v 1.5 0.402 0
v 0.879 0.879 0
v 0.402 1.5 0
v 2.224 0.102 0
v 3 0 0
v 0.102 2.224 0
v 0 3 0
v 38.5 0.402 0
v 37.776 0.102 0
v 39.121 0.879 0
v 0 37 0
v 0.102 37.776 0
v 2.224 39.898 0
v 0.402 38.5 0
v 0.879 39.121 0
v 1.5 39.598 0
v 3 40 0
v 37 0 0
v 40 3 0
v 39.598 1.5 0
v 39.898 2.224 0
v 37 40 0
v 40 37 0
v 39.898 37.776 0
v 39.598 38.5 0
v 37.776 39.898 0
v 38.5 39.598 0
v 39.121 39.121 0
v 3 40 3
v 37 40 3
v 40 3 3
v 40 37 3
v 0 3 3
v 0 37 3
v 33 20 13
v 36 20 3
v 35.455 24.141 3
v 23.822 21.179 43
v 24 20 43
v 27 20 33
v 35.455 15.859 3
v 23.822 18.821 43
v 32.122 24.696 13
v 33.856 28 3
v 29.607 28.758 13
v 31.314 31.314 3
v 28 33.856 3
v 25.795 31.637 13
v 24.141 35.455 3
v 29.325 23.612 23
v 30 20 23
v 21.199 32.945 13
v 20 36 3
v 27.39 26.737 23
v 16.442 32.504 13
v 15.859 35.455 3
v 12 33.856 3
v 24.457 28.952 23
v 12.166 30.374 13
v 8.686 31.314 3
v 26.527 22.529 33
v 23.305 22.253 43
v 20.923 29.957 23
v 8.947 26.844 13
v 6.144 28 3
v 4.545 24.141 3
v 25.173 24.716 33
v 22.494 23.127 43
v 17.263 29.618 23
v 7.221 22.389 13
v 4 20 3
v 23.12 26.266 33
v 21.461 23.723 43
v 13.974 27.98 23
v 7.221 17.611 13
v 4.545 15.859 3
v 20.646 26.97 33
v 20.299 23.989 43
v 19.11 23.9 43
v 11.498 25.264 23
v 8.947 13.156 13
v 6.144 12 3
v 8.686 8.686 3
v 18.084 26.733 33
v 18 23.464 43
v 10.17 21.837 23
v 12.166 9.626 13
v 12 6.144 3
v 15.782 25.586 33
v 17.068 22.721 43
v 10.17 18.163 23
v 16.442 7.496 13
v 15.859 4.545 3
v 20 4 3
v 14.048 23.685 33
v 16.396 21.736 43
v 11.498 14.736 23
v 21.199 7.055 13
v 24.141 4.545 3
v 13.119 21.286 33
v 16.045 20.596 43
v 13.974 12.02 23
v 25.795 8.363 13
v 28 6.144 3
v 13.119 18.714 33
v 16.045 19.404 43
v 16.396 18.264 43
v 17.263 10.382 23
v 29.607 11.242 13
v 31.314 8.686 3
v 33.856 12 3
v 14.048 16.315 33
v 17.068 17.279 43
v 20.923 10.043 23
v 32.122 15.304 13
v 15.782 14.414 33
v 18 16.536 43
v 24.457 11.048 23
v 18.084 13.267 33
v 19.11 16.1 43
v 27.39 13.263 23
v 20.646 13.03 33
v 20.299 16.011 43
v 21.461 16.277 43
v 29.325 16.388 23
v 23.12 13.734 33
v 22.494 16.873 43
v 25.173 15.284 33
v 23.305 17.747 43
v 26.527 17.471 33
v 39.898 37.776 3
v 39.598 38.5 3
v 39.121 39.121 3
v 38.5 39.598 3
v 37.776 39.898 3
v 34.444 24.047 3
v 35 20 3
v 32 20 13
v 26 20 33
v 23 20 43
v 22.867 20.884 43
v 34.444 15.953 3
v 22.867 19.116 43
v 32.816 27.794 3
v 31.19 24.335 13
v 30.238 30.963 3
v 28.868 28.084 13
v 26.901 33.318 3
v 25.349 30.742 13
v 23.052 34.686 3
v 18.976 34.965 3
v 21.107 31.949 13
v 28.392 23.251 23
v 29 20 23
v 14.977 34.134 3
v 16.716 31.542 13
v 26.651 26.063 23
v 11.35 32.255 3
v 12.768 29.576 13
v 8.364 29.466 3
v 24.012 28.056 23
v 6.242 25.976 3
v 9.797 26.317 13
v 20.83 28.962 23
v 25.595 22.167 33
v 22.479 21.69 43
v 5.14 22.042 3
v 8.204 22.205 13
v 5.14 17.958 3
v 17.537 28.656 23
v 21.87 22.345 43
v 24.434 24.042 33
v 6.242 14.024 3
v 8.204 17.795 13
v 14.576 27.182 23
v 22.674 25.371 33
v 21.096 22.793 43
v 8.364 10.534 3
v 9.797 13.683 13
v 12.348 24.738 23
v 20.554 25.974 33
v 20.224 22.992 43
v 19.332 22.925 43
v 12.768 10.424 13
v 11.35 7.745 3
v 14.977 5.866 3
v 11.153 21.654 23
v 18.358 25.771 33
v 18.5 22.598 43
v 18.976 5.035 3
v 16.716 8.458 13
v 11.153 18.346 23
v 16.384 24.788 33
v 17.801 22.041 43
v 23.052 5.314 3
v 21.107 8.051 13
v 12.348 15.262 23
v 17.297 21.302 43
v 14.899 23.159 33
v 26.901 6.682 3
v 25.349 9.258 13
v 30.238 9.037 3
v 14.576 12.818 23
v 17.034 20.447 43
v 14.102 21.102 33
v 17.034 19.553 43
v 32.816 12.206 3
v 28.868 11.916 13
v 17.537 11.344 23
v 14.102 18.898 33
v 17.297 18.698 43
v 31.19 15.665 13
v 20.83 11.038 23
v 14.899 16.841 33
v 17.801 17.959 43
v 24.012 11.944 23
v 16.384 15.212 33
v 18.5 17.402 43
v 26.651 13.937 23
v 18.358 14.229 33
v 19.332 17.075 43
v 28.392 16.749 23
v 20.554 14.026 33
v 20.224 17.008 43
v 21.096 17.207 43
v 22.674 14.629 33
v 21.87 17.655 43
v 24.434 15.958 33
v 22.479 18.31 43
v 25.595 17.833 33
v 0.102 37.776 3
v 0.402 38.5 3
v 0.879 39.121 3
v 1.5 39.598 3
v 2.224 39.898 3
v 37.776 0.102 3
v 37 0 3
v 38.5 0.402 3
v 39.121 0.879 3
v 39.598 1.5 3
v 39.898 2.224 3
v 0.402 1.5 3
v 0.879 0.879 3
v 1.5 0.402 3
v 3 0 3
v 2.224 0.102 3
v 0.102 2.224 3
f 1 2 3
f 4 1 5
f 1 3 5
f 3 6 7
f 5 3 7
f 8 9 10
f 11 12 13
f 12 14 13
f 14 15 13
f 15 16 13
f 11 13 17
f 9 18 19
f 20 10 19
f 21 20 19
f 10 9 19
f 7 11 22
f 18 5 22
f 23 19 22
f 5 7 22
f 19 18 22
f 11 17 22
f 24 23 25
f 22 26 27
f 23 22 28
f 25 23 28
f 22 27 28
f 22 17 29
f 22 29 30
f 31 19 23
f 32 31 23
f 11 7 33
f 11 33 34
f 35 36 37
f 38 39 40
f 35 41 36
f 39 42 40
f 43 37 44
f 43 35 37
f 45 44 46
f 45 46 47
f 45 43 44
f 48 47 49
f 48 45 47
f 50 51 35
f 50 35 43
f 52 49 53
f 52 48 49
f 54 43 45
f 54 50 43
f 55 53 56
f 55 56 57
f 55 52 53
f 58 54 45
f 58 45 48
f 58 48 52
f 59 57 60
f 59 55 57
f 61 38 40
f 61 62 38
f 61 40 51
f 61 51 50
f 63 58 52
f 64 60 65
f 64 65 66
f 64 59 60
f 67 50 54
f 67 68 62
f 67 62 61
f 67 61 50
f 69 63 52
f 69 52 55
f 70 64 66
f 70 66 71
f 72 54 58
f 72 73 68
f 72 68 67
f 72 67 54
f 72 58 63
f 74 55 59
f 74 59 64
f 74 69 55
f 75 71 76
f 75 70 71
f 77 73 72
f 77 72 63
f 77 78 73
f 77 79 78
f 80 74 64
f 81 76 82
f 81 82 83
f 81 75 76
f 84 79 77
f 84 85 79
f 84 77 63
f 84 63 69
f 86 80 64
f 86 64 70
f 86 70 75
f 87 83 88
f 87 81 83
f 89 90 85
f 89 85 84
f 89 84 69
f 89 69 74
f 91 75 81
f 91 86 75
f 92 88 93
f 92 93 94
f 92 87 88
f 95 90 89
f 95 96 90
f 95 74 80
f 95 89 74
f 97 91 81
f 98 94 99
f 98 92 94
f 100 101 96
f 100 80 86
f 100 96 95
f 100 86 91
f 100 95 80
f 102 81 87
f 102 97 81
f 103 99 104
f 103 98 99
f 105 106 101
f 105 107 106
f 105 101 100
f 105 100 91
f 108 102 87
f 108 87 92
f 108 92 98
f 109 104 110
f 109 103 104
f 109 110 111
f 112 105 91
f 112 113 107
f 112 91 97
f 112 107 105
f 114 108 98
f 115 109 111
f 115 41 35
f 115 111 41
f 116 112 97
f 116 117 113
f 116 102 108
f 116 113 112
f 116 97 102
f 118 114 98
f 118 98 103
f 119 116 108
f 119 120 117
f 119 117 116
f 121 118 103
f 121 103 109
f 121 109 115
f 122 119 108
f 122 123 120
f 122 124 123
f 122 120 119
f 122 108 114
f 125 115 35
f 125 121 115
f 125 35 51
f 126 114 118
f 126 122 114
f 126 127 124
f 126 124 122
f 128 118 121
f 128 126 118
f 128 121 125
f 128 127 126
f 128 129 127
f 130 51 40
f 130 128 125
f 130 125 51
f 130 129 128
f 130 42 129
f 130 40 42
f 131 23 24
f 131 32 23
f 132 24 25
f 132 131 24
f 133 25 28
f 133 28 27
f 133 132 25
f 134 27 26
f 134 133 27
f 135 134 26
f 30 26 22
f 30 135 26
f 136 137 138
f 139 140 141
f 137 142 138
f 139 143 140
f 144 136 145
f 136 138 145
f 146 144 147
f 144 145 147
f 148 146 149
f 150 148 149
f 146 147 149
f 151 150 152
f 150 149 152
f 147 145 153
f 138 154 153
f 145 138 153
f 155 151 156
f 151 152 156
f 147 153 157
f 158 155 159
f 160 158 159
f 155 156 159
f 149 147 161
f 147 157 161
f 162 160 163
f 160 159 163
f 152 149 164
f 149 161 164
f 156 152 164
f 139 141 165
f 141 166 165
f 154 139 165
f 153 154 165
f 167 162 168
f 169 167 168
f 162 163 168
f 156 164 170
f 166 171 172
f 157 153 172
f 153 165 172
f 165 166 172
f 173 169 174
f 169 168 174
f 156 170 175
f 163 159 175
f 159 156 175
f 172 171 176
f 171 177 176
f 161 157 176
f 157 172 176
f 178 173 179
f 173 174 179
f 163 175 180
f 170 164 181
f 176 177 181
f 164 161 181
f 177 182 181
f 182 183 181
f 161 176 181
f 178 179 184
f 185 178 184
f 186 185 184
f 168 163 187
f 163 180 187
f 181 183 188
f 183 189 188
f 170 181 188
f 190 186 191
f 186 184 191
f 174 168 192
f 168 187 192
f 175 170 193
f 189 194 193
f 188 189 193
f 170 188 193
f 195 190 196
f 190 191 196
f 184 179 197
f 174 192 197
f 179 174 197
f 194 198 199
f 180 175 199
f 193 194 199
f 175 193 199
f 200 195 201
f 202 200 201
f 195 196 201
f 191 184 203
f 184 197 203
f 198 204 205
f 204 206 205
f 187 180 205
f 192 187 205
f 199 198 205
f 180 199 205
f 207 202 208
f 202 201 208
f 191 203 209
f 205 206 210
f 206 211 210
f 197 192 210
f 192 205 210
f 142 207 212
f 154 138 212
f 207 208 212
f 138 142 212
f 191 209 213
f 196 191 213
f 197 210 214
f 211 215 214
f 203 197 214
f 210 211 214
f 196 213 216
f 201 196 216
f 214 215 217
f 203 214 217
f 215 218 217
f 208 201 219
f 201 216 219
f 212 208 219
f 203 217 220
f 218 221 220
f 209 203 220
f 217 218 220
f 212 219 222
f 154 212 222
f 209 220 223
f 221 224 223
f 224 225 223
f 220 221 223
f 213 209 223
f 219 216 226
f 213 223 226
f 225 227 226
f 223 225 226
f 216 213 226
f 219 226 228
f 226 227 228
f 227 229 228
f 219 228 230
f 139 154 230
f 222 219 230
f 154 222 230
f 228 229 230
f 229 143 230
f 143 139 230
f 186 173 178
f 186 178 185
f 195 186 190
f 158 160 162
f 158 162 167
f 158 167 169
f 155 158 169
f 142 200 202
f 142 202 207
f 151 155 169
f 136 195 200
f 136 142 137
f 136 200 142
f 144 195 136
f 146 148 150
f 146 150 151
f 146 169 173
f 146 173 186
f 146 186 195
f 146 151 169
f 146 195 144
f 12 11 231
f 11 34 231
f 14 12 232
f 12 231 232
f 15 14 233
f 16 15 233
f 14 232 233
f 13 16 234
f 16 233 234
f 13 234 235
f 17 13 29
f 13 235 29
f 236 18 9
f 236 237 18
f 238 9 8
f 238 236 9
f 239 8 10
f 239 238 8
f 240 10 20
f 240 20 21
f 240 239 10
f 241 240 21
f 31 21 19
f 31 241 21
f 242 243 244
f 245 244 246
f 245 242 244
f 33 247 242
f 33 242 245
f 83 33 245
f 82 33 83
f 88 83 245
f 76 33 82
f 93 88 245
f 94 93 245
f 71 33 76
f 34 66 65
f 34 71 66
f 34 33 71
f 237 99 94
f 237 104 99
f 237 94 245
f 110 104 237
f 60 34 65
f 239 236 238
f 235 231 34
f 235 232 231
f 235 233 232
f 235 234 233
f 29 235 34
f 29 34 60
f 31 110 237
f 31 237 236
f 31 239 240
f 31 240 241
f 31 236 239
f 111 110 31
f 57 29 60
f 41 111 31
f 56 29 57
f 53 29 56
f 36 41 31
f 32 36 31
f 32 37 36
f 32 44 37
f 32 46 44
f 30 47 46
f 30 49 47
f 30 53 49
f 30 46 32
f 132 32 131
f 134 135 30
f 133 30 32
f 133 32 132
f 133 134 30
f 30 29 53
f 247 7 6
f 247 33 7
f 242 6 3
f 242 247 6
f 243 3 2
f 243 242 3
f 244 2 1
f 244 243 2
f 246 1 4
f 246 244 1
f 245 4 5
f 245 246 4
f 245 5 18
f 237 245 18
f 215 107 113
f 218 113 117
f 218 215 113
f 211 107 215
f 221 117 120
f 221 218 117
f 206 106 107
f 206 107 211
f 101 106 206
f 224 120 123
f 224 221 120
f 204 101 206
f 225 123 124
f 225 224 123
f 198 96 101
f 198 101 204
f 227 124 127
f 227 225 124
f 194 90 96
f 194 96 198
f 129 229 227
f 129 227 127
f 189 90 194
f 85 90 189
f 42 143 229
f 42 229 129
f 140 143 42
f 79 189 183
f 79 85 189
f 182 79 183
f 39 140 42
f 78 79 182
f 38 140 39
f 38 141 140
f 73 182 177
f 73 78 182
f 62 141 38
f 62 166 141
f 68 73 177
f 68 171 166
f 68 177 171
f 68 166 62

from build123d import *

# Parameters (mm, degrees)
BOX_W     = 40
BOX_H     = 40
BOX_DEPTH = 3
FILLET_R  = 3


with BuildPart() as cone001:
    # Cone001 → Cone001 (revolve)
    with BuildSketch(Plane(origin=(20, 20, 3), x_dir=(1, 0, 0), z_dir=(0, -1, 0))):
        Polygon((0, 0), (15, 0), (3, 40), (0, 40), align=None)
    revolve(axis=Axis((20, 20, 3), (0, 0, 1)))


with BuildPart() as cut:
    # Cone → Cone (revolve)
    with BuildSketch(Plane(origin=(20, 20, 3), x_dir=(1, 0, 0), z_dir=(0, -1, 0))):
        Polygon((0, 0), (16, 0), (4, 40), (0, 40), align=None)
    revolve(axis=Axis((20, 20, 3), (0, 0, 1)))

    # Cut: cut Cone001
    add(cone001.part, mode=Mode.SUBTRACT)


with BuildPart() as con_trafic:
    # Box → Box (new body)
    with BuildSketch(Plane.XY):
        with Locations((20, 20)):
            Rectangle(BOX_W, BOX_H)
    extrude(amount=BOX_DEPTH)

    # Fillet
    fillet_edges = [con_trafic.edges().sort_by_distance(p)[0] for p in [
        (0, 0, 1.5),
        (0, 40, 1.5),
        (40, 0, 1.5),
        (40, 40, 1.5),
    ]]
    fillet(fillet_edges, radius=FILLET_R)

    # Fusion: union Cut
    add(cut.part)


solid = con_trafic.part
